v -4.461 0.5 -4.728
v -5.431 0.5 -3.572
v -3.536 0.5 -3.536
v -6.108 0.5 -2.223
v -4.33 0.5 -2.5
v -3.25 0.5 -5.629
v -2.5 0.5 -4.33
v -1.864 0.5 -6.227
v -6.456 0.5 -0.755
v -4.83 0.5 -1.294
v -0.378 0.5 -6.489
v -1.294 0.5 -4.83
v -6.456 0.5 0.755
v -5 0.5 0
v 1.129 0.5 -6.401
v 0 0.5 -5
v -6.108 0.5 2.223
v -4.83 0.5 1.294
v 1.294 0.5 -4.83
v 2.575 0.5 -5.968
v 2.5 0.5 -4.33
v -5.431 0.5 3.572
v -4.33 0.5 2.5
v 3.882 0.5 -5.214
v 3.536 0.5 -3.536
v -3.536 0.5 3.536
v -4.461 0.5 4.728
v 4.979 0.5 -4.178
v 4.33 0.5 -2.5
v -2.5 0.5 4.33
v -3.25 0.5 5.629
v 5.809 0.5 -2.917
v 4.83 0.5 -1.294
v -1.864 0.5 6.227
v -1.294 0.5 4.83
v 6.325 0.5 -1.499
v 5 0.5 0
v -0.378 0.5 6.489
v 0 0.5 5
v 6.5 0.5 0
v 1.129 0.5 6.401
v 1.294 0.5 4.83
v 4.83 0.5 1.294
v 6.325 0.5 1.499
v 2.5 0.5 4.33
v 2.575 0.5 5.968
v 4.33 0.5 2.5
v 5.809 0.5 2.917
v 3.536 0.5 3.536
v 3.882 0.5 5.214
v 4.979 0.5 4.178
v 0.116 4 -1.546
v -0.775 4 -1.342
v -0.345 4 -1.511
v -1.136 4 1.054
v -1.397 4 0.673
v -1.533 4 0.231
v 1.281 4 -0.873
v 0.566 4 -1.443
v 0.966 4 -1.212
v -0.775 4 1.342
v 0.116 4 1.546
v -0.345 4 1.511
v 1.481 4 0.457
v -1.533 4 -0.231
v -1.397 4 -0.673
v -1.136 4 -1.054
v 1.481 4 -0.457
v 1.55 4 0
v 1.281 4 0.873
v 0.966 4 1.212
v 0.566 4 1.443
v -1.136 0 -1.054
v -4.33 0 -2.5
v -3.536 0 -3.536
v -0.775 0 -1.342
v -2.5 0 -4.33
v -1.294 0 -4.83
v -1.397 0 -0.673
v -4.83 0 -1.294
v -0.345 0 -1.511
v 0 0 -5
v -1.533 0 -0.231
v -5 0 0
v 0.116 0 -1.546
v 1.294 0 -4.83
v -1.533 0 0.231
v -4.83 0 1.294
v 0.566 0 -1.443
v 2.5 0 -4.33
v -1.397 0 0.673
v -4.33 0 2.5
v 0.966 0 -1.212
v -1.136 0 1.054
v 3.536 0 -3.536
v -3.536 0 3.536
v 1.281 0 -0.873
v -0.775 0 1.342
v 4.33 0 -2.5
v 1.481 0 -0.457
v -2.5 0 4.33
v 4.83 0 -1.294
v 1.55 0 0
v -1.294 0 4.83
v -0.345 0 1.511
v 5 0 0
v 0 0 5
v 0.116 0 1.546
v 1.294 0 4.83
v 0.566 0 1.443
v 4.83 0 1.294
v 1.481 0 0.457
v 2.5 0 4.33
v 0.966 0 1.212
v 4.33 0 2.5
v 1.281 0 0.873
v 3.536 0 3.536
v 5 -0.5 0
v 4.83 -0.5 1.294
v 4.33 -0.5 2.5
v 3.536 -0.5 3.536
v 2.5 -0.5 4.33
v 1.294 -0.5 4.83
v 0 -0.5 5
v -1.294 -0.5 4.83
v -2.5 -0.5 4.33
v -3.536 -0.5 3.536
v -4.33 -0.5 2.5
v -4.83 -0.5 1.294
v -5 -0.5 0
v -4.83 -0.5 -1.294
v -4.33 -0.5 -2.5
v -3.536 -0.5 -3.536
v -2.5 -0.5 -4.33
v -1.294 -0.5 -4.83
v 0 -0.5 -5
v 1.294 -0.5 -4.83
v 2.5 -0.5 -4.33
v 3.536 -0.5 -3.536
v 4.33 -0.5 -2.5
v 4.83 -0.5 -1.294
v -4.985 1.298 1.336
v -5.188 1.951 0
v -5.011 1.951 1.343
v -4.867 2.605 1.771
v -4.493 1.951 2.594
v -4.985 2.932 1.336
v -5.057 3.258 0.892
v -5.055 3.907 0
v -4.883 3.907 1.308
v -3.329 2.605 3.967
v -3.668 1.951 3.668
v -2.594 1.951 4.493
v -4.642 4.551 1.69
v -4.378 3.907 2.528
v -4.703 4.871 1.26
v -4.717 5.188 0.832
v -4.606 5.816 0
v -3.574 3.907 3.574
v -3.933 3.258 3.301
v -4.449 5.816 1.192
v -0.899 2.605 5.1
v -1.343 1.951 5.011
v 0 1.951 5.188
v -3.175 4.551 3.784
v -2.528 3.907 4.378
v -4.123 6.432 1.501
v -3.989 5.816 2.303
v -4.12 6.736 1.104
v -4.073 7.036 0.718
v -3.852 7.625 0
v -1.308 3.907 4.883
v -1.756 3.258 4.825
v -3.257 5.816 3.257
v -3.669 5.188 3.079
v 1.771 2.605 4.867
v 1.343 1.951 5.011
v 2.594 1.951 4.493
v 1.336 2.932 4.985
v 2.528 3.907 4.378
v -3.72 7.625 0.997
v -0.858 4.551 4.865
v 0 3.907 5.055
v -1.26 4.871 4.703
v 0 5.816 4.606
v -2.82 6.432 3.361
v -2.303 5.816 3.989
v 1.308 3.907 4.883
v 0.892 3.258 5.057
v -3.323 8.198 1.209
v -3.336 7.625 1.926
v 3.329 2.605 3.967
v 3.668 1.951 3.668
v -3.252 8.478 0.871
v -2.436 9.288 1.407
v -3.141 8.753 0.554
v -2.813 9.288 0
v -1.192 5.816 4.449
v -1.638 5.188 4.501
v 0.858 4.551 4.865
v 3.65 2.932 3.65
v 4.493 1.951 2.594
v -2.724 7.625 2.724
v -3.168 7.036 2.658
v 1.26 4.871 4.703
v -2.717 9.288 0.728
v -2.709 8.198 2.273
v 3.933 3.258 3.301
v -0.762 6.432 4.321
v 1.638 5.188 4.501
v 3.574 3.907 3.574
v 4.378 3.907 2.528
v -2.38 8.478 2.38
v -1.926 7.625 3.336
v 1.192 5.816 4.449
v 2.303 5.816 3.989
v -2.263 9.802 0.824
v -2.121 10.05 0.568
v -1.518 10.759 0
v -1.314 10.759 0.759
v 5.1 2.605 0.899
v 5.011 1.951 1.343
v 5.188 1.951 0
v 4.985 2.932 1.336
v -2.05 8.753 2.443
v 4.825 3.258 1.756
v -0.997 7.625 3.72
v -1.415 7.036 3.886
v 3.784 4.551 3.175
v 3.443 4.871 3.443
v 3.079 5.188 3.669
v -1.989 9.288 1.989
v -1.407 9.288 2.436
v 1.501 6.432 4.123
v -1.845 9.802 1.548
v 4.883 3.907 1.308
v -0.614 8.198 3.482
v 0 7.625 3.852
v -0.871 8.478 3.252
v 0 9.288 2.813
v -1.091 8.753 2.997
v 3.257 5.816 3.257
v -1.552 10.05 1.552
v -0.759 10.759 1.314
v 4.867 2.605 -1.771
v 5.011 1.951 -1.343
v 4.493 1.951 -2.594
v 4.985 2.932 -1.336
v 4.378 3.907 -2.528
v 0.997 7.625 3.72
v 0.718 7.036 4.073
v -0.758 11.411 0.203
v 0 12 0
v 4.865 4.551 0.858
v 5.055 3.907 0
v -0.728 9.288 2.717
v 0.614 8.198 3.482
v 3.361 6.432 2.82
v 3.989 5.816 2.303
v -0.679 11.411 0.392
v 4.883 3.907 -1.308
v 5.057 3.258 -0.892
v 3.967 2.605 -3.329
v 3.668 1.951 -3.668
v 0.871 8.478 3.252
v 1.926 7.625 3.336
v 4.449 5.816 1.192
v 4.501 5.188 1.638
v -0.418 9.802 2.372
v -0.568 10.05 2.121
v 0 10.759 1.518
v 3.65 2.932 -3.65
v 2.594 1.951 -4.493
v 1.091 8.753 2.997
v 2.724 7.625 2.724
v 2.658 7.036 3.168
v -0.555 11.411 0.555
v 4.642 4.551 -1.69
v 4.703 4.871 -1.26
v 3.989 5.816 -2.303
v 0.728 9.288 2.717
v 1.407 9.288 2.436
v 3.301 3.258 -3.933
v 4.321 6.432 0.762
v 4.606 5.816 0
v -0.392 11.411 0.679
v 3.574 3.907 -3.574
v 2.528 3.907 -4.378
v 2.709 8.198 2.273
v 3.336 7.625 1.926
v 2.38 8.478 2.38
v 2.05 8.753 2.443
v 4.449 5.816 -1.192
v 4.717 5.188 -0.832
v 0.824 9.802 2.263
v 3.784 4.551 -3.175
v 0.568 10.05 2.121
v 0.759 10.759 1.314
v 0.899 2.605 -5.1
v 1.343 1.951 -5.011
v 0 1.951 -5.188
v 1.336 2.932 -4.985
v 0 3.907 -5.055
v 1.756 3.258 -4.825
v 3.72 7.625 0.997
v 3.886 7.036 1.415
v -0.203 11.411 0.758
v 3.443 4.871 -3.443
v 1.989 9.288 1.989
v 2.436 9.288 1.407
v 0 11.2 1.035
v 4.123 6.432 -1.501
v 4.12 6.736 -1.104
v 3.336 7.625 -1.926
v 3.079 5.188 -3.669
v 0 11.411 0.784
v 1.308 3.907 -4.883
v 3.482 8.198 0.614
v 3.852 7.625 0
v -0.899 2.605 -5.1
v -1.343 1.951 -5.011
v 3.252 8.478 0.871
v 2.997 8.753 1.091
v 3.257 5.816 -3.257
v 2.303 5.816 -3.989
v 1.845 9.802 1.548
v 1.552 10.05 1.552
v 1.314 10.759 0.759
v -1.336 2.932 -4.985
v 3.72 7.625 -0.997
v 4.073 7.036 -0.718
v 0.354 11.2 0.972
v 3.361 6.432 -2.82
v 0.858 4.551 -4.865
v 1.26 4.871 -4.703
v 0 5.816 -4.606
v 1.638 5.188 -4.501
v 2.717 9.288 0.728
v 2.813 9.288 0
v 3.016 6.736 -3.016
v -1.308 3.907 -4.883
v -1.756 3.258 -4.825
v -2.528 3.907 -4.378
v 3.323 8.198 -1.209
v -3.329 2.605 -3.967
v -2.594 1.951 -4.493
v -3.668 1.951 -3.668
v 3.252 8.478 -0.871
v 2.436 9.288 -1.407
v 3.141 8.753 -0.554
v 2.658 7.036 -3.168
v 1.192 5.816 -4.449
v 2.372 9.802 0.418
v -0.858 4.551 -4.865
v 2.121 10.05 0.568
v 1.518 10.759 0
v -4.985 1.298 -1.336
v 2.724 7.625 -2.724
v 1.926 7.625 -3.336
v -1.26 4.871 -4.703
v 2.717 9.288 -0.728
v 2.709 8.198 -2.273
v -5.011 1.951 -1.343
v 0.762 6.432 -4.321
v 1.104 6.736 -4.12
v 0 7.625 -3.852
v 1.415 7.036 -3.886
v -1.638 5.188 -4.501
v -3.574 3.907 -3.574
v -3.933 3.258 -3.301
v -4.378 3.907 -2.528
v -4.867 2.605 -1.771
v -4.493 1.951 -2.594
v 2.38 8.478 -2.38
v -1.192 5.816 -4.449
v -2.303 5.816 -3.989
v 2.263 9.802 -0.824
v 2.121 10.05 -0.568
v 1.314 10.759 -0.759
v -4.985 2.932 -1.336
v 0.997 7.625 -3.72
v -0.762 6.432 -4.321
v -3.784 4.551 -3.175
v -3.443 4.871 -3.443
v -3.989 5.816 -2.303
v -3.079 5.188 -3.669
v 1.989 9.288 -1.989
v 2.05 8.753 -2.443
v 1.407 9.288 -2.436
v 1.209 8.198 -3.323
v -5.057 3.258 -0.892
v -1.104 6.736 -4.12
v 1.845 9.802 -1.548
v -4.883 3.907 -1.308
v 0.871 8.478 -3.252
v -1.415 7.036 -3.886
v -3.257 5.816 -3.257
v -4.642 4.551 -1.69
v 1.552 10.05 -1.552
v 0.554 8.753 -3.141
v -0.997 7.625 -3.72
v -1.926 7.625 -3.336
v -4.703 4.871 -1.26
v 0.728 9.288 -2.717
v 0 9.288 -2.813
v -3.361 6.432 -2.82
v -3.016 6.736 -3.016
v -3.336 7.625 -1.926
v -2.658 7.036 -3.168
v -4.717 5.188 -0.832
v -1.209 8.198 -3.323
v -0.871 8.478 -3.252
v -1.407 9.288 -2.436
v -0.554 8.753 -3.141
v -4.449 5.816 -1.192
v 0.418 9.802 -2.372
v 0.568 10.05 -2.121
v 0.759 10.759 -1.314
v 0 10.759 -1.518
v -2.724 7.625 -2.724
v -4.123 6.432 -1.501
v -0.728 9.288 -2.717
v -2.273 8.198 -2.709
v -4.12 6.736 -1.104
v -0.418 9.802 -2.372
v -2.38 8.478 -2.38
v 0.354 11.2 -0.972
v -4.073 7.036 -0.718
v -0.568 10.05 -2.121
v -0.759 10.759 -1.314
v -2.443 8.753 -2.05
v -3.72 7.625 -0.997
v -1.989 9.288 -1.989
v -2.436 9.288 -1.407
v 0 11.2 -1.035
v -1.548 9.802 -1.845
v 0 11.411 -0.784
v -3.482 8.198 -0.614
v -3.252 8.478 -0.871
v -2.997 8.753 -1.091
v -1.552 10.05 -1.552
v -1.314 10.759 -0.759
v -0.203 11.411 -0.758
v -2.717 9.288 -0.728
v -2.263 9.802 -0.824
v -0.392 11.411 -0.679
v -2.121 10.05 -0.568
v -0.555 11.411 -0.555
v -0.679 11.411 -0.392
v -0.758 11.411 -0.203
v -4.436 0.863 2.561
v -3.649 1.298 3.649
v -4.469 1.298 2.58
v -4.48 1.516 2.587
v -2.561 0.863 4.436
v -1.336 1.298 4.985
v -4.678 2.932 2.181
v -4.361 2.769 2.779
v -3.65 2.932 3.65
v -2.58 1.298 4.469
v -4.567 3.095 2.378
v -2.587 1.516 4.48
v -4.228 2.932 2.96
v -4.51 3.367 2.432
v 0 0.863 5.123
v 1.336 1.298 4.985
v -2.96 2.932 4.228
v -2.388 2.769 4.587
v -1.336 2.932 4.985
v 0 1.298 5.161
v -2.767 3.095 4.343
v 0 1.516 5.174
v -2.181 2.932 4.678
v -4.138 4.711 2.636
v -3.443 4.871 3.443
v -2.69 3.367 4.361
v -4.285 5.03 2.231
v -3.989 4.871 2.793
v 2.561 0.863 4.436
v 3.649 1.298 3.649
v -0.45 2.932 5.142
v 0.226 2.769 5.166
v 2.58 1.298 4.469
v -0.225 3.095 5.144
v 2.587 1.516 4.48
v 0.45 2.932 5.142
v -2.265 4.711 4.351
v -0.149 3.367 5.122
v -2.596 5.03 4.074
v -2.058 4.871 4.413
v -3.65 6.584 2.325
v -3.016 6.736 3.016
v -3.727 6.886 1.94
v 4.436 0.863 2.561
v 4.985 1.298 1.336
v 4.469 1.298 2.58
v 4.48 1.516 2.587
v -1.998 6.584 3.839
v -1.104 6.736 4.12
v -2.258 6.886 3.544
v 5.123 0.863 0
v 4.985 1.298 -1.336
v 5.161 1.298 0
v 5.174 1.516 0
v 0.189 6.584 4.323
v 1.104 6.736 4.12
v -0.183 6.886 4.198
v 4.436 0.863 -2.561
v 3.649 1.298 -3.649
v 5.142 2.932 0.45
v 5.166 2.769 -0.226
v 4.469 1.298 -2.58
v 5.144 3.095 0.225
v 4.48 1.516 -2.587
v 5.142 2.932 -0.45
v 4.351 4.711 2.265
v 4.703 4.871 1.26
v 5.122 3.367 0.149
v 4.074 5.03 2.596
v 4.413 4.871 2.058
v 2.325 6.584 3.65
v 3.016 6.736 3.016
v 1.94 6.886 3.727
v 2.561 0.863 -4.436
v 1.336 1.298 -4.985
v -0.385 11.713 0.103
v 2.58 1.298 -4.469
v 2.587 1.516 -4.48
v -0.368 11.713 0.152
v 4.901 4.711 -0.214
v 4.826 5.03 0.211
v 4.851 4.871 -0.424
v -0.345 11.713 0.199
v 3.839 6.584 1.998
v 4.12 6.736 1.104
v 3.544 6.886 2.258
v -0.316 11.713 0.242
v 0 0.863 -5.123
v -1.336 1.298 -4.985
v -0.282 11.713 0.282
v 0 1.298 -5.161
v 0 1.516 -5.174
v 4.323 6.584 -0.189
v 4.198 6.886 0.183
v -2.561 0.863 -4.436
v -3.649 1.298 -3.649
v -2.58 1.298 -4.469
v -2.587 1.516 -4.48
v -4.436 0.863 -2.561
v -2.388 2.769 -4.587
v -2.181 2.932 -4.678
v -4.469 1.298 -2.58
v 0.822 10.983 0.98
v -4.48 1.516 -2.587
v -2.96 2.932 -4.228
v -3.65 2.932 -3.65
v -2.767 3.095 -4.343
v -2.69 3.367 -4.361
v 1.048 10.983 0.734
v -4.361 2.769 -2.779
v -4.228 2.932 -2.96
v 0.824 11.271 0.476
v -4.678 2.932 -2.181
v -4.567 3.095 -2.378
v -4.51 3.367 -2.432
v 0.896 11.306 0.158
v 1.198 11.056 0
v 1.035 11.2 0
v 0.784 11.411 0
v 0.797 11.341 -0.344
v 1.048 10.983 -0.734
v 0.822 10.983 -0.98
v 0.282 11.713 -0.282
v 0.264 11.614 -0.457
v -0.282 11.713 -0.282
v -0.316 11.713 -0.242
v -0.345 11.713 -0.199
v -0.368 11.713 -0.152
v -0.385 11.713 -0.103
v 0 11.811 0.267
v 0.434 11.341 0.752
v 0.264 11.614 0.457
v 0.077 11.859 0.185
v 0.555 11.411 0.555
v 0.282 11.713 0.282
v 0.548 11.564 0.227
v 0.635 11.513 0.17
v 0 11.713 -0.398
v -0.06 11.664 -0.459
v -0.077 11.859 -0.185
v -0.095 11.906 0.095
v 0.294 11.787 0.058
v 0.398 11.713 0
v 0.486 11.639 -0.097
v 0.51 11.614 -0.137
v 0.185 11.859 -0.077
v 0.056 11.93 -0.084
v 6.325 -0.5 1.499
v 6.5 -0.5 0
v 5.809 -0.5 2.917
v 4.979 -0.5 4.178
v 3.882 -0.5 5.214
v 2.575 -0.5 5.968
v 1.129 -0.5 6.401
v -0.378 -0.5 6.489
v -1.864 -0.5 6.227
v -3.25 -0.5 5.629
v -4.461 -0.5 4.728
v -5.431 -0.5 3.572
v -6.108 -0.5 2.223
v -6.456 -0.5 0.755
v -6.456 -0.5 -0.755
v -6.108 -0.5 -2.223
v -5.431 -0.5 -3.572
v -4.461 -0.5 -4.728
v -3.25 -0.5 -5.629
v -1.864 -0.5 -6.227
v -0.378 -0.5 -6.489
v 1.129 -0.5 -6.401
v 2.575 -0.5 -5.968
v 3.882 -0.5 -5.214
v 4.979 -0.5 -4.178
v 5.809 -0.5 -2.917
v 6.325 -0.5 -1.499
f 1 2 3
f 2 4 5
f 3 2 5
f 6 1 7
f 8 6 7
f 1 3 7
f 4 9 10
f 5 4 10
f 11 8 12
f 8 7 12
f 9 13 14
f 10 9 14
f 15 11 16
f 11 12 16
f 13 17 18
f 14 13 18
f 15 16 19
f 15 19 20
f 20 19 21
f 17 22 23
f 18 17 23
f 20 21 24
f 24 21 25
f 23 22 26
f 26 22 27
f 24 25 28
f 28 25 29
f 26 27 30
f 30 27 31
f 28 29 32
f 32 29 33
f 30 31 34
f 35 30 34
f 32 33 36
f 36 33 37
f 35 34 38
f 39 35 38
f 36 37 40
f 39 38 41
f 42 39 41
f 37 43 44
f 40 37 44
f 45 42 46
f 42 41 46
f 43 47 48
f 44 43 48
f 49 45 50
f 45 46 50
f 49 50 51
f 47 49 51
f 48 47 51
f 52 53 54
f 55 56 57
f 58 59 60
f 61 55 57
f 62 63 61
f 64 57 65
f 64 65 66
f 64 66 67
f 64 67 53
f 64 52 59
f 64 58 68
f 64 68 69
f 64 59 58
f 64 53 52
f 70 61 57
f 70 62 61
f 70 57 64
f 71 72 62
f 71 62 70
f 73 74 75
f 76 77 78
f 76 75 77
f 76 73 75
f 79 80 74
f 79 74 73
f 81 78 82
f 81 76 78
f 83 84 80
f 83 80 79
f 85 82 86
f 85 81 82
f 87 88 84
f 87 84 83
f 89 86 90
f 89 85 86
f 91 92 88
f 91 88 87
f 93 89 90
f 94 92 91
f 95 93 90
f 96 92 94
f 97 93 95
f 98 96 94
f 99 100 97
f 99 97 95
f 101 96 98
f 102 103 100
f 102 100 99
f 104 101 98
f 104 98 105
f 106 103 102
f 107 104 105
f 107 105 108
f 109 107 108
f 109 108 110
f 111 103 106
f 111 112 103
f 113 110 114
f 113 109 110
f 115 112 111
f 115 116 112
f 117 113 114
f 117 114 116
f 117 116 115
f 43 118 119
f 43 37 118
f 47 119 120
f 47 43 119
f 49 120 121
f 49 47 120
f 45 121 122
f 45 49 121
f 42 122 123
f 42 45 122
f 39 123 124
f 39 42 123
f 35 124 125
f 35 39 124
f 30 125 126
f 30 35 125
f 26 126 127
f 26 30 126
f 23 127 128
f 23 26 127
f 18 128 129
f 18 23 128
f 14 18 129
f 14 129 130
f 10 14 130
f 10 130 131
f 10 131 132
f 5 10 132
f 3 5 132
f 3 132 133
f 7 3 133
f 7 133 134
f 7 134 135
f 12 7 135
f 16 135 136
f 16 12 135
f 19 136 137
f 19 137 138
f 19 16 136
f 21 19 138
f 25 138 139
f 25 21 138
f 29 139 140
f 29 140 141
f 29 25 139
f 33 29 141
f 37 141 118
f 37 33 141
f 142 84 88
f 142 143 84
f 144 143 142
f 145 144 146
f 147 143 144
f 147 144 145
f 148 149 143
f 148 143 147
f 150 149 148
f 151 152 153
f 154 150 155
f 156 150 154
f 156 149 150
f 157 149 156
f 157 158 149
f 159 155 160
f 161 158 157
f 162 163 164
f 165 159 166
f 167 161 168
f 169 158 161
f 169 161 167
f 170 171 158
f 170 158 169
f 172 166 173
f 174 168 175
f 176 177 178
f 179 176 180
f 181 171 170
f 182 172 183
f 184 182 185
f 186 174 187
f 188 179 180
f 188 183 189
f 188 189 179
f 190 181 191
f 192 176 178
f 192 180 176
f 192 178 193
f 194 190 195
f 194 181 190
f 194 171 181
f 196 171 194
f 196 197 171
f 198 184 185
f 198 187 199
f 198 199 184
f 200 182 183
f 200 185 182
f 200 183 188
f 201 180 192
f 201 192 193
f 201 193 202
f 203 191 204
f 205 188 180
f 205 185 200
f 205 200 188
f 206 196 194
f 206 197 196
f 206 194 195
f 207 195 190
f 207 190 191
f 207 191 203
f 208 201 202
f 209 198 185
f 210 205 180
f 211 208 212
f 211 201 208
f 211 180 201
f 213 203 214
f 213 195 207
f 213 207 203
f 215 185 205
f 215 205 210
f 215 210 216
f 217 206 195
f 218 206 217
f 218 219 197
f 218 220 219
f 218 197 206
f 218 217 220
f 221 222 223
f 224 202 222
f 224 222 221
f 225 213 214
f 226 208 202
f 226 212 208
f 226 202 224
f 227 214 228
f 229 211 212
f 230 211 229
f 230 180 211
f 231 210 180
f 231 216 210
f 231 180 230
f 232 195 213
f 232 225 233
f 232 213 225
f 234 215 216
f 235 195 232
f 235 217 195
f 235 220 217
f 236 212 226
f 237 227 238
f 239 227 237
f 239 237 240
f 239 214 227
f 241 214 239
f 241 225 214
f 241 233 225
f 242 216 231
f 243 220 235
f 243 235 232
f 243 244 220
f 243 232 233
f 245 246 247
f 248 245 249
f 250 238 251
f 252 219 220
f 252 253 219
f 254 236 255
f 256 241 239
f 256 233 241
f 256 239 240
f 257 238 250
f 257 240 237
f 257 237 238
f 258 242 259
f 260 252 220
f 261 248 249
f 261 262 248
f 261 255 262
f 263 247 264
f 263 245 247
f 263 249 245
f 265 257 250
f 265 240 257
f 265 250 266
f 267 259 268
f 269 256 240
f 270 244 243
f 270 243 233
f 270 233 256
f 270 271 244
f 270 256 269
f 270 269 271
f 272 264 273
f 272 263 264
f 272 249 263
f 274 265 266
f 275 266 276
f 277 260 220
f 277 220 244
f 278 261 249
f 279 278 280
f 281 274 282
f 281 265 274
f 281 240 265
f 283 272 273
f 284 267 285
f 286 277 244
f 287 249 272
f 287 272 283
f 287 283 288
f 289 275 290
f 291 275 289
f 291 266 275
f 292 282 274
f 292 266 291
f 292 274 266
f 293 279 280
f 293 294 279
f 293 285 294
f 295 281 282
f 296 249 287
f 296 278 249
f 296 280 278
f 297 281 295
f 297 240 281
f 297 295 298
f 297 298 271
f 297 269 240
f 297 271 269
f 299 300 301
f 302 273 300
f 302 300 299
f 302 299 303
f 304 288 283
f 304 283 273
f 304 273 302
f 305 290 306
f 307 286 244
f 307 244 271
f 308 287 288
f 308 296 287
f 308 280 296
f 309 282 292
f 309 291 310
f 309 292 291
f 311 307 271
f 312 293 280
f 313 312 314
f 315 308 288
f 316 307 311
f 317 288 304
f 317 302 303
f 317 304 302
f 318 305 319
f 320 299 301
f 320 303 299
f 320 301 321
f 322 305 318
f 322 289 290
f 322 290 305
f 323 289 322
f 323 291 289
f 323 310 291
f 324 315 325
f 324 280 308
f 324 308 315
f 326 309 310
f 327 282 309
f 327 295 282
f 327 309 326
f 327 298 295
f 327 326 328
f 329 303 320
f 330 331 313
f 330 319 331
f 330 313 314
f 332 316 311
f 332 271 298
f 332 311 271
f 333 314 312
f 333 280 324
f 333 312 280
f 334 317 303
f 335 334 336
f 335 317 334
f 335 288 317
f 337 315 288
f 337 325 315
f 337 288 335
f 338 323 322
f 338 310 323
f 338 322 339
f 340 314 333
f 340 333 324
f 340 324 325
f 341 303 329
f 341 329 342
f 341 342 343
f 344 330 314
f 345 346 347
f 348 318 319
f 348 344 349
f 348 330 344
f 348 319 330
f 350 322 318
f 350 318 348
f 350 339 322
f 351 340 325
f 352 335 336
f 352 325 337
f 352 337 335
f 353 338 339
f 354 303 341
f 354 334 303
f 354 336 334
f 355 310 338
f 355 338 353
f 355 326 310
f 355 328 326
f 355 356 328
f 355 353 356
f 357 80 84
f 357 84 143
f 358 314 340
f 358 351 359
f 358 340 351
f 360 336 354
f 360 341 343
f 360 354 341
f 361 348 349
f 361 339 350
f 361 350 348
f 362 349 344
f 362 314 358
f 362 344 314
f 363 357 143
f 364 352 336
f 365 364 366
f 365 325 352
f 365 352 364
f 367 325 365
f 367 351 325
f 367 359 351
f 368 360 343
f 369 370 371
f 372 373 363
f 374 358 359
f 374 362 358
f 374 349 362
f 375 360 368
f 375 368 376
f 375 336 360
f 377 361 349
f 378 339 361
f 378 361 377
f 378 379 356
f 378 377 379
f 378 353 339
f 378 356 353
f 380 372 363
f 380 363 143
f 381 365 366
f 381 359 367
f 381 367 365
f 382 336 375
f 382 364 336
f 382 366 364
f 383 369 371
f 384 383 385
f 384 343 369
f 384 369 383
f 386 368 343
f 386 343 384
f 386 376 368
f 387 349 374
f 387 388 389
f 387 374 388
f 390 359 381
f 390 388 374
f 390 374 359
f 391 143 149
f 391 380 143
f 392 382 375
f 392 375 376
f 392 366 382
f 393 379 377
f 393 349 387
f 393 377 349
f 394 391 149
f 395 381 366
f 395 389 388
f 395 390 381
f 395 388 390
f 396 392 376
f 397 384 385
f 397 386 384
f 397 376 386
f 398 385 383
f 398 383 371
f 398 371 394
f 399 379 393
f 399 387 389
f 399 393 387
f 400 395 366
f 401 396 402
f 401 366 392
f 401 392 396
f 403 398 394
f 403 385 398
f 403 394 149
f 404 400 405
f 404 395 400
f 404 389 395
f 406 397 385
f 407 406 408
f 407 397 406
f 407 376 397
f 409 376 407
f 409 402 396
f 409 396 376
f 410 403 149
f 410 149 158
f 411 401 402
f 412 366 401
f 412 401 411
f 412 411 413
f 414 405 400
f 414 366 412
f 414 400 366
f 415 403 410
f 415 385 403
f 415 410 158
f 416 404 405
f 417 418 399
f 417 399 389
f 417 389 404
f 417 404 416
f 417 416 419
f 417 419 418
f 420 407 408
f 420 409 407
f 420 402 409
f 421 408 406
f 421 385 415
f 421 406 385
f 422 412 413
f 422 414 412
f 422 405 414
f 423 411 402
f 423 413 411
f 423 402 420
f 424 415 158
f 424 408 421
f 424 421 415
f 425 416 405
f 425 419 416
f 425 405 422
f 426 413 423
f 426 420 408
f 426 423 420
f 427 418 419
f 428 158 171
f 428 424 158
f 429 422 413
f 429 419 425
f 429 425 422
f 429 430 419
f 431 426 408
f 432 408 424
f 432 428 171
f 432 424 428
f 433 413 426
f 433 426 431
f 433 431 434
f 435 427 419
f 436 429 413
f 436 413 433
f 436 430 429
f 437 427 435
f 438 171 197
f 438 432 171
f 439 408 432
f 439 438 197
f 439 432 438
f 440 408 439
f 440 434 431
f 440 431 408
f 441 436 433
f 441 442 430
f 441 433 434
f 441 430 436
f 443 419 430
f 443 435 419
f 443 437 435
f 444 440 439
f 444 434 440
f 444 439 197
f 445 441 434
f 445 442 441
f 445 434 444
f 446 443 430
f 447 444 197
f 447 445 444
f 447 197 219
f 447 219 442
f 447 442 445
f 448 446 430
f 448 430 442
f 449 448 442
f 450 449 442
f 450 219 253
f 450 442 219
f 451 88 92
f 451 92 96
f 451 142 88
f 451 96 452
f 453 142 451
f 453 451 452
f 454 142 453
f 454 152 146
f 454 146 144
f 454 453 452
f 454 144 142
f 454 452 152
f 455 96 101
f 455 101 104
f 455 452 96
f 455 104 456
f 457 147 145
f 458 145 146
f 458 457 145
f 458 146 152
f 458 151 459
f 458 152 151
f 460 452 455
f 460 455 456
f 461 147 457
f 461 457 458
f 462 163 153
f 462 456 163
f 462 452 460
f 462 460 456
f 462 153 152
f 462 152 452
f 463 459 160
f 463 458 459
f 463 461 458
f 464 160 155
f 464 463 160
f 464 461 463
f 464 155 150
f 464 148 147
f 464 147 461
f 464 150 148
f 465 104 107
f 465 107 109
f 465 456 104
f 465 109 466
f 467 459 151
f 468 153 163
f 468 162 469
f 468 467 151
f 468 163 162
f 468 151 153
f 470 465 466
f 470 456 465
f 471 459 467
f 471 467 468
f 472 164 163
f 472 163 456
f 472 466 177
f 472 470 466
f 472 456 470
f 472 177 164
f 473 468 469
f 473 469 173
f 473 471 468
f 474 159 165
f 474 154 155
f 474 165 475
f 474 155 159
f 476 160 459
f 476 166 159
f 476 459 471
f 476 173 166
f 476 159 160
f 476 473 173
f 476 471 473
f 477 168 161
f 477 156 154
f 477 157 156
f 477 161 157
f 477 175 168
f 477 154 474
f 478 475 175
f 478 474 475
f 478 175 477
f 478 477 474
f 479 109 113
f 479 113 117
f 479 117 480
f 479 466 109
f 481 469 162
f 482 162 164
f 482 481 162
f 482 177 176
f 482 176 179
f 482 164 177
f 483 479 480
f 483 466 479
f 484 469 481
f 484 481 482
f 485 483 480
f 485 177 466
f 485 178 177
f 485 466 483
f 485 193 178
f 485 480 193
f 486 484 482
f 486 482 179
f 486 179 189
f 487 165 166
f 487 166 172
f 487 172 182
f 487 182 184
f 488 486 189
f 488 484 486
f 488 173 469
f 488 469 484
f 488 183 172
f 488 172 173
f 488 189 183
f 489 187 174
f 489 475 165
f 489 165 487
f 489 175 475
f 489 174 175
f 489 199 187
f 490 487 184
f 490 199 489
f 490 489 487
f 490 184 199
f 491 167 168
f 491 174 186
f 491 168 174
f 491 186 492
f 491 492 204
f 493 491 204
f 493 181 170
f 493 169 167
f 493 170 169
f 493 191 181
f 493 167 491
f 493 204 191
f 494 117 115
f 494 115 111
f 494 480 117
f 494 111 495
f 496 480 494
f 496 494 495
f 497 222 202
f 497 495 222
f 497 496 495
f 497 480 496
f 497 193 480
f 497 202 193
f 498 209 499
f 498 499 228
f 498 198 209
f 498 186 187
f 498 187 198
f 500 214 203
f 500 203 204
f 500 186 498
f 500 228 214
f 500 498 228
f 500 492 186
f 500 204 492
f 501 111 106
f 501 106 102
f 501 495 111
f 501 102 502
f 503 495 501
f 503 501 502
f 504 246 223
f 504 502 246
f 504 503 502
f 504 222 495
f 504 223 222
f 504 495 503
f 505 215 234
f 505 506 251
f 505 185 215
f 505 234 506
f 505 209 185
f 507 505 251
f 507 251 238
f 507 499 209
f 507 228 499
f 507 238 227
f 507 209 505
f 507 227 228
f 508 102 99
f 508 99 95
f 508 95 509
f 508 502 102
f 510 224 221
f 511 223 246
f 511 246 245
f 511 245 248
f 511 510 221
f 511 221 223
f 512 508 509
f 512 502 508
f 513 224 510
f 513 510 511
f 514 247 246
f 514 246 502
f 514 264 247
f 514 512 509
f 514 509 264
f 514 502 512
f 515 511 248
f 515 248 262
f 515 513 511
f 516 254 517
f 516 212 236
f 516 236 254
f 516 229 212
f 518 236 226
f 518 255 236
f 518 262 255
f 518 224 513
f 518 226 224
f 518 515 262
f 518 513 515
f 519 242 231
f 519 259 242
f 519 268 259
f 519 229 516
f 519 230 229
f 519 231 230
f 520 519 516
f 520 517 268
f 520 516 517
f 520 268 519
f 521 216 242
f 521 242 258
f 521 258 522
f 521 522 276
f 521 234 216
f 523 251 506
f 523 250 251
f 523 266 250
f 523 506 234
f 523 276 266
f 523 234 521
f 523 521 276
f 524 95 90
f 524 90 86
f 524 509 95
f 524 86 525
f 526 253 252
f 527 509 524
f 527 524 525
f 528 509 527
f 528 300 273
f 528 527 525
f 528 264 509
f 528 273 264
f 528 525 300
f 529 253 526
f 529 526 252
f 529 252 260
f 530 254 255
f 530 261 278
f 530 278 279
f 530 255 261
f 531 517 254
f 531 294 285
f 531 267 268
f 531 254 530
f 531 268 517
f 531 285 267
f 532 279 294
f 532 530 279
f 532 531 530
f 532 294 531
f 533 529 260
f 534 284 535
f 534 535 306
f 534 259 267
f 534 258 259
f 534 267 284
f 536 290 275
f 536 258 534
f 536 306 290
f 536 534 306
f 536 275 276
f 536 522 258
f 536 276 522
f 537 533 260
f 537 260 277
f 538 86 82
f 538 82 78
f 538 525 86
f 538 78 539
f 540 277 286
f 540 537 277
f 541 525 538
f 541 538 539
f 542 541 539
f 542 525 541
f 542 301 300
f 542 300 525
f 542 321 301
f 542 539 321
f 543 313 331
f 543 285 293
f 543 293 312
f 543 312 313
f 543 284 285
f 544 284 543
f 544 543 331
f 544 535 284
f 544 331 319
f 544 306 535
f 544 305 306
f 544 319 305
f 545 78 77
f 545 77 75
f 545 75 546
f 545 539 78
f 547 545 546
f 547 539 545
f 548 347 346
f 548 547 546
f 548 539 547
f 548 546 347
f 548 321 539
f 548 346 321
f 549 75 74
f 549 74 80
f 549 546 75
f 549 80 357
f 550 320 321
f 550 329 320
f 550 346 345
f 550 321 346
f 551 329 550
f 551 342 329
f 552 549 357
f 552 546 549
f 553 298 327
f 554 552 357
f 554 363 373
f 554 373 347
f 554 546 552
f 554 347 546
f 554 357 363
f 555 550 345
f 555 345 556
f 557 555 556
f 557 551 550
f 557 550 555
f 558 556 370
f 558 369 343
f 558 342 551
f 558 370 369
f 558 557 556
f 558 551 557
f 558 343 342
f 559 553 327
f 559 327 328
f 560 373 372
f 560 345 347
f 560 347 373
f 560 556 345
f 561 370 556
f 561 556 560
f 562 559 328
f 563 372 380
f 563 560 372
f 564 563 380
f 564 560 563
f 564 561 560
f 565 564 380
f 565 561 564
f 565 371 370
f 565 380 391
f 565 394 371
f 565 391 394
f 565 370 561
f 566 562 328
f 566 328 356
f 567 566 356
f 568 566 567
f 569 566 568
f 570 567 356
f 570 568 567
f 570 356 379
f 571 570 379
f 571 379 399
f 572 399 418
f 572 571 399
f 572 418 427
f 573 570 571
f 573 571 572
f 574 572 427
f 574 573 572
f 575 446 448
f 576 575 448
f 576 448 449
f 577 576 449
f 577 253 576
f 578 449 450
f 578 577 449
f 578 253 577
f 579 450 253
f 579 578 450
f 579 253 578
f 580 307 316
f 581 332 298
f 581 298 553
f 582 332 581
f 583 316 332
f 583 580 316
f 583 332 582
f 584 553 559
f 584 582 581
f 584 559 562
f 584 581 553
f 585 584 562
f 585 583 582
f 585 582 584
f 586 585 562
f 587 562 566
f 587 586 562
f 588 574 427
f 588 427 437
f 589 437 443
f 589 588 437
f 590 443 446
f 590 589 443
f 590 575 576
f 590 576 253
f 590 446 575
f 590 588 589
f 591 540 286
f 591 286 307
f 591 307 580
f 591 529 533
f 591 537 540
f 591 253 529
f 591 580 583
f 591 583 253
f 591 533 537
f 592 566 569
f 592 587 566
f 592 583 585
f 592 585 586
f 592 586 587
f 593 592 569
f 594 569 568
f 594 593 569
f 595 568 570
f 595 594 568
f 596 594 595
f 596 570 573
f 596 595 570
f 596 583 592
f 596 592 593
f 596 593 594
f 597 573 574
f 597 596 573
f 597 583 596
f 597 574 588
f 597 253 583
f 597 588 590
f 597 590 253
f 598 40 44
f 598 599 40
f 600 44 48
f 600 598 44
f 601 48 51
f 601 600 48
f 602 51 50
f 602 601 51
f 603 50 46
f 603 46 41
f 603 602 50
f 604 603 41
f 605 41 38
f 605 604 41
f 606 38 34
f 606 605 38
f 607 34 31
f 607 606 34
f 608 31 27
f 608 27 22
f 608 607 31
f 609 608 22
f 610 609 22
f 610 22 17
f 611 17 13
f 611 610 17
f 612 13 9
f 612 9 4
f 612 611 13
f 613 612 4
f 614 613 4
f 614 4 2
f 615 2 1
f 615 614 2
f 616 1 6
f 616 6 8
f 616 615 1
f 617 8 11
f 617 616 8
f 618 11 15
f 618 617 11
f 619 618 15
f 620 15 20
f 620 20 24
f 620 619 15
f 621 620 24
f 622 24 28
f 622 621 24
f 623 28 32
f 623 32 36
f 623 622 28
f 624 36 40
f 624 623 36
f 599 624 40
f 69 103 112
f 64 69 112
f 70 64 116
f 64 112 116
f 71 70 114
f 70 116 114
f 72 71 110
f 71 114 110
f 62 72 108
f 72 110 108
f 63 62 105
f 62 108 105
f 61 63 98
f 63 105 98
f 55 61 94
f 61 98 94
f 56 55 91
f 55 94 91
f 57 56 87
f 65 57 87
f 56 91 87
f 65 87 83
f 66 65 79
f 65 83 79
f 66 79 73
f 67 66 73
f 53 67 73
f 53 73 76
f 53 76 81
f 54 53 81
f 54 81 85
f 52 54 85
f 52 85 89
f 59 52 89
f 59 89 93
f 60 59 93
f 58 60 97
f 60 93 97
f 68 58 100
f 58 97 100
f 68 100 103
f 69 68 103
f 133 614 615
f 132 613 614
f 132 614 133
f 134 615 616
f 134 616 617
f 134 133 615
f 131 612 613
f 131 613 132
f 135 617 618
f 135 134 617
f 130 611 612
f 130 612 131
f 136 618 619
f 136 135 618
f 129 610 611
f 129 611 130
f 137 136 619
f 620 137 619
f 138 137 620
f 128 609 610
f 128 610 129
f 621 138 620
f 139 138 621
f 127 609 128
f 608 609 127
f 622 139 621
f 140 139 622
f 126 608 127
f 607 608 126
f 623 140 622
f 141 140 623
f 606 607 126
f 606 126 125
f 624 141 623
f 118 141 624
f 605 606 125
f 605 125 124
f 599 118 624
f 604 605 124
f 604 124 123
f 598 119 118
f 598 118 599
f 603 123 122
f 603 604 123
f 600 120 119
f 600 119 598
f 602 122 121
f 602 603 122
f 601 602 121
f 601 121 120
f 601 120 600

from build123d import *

# Parameters (mm, degrees)
CROQUIS2_R              = 6.5
CROQUIS2_R_2            = 5
SALIENTE_EXTRUIR1_DEPTH = 0.5
CROQUIS3_R              = 1.55
CORTAR_EXTRUIR1_DEPTH   = 4


with BuildPart() as part:
    # Croquis1 → Revolución1 (revolve)
    with BuildSketch(Plane.XY):
        with BuildLine():
            Line((0, 0), (-5, 0))
            ThreePointArc((-5, 0), (-4.265734922, 6.735722884), (0, 12))
            Line((0, 12), (0, 0))
        make_face()
    revolve(axis=Axis((0, 0, 0), (0, 1, 0)))

    # Croquis3 → Cortar-Extruir1 (cut)
    with BuildSketch(Plane.XZ):
        Circle(CROQUIS3_R)
    extrude(amount=-CORTAR_EXTRUIR1_DEPTH, mode=Mode.SUBTRACT)


with BuildPart() as body_2:
    # Croquis2 → Saliente-Extruir1 (new body, symmetric)
    with BuildSketch(Plane.XZ):
        Circle(CROQUIS2_R)
        Circle(CROQUIS2_R_2, mode=Mode.SUBTRACT)
    extrude(amount=SALIENTE_EXTRUIR1_DEPTH, both=True)


solid = Compound([part.part, body_2.part])
